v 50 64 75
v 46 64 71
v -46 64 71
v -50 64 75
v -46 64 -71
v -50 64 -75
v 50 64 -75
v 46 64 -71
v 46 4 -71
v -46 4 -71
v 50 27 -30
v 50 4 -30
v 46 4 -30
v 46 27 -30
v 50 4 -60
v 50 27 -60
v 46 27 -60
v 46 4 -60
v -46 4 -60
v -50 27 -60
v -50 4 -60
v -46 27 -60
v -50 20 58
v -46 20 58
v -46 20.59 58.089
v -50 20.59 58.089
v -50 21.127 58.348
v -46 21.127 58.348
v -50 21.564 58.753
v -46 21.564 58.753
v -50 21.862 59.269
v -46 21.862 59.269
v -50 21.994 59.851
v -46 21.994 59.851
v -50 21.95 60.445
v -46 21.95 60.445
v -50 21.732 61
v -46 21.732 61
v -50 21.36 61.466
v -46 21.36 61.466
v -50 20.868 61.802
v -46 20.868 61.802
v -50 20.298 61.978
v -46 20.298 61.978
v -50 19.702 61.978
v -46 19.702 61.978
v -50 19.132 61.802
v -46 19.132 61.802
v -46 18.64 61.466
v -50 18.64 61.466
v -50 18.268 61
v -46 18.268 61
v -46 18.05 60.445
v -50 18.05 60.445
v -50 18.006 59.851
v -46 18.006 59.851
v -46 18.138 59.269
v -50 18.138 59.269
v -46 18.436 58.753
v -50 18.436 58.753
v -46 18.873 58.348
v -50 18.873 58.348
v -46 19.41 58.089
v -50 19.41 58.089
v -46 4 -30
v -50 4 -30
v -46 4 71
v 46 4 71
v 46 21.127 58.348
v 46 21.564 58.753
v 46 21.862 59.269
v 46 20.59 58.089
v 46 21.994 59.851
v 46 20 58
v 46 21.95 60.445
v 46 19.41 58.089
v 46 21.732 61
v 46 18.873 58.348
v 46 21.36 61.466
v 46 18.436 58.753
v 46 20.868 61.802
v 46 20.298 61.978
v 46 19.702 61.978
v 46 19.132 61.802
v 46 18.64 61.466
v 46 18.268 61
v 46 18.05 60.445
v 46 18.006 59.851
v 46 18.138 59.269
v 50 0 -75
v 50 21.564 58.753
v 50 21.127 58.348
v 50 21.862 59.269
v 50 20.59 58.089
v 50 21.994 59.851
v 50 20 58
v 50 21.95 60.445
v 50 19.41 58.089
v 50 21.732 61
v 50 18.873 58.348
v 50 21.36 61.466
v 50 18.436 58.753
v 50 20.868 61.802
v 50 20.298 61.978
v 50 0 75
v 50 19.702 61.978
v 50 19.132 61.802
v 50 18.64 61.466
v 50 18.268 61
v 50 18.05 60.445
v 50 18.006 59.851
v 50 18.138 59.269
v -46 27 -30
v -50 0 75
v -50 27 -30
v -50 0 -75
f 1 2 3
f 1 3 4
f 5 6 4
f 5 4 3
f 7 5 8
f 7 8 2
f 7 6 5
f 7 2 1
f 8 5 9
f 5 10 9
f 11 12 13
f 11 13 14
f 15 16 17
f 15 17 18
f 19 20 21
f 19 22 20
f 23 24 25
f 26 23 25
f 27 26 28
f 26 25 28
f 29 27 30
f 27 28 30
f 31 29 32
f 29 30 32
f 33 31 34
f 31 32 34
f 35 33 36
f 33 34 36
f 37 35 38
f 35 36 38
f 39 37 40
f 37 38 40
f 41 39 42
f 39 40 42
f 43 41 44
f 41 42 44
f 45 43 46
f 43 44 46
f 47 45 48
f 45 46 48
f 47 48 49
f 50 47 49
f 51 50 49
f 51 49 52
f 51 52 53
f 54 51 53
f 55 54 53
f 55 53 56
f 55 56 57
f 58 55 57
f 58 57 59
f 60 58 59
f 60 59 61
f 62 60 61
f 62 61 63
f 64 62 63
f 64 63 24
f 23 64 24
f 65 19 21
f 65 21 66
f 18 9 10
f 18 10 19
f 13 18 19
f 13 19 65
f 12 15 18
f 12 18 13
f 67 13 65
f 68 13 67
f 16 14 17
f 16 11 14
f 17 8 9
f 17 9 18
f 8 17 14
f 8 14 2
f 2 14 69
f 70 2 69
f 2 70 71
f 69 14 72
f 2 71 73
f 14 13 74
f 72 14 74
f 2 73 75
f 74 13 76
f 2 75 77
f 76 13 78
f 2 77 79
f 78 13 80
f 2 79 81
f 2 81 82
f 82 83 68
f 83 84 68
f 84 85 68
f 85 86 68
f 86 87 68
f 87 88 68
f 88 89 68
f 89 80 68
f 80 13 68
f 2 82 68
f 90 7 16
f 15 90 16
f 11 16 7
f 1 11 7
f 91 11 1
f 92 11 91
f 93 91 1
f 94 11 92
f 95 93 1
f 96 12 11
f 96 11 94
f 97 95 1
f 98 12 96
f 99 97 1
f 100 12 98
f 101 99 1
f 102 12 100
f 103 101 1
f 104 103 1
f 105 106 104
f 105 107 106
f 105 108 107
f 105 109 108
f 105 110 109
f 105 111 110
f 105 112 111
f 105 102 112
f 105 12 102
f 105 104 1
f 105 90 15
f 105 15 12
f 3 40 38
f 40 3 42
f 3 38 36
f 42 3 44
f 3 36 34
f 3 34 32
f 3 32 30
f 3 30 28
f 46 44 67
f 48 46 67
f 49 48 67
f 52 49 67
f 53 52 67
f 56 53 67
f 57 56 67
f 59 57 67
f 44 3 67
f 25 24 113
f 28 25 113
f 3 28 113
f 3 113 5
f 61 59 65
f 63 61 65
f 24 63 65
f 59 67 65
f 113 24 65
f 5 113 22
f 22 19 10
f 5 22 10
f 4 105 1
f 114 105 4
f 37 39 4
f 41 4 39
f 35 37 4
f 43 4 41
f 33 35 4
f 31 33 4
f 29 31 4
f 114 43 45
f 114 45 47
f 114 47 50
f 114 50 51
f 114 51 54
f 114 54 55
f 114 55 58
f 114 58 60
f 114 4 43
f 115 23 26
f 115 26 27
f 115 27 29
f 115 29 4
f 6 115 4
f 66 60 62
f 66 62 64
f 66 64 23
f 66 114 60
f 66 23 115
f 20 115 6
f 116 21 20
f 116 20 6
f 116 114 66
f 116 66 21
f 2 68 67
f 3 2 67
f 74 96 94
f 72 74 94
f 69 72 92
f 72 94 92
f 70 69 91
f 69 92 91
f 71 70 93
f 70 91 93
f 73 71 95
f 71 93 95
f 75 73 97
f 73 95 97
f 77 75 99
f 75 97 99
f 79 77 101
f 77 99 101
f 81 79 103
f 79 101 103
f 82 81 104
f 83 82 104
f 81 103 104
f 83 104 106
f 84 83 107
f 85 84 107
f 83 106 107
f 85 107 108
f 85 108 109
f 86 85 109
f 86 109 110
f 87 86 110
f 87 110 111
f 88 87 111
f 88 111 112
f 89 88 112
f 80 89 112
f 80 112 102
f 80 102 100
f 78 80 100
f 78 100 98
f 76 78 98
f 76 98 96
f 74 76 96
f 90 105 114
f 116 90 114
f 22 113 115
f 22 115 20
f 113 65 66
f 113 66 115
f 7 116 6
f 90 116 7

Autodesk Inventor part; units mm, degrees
ref_plane "YZ Plane" through (0, 0, 0) normal (1, 0, 0) x (0, 1, 0)
ref_plane "XZ Plane" through (0, 0, 0) normal (0, 1, 0) x (-1, 0, 0)
ref_plane "XY Plane" through (0, 0, 0) normal (0, 0, 1) x (1, 0, 0)
sketch "Эскиз1" plane through (0, 0, 0) normal (0, 1, 0) x (-1, 0, 0)
  line L0 (-50, 75) -> (50, 75)
  line L1 (50, 75) -> (50, -75)
  line L2 (50, -75) -> (-50, -75)
  line L3 (-50, -75) -> (-50, 75)
  line L4 (-50, 75) -> (50, -75) construction
  line L5 (50, 75) -> (-50, -75) construction
  point P0 (0, 0)
  dimension "d0" = 150
  dimension "d1" = 100
extrude "Выдавливание1" add sketch "Эскиз1" along normal blind 4
sketch "Эскиз2" plane through (0, 4, 0) normal (0, 1, 0) x (1, 0, 0)
  line L0 (50, 75) -> (-50, 75) projected
  line L1 (50, -75) -> (-50, -75)
  line L2 (-50, -75) -> (-50, 75)
  line L3 (-50, 75) -> (50, 75)
  line L4 (50, 75) -> (50, -75)
  line L5 (50, -75) -> (-50, 75) construction
  line L6 (-50, -75) -> (50, 75) construction
  line L7 (46, -71) -> (-46, -71)
  line L8 (-46, -71) -> (-46, 71)
  line L9 (-46, 71) -> (46, 71)
  line L10 (46, 71) -> (46, -71)
  line L11 (46, -71) -> (-46, 71) construction
  line L12 (-46, -71) -> (46, 71) construction
  point P0 (0, 0)
  dimension "d4" = 4
  dimension "d5" = 4
extrude "Выдавливание2" add sketch "Эскиз2" along normal blind 60
sketch "Эскиз3" plane through (50, 0, 75) normal (1, 0, 0) x (0, 0, -1)
  line L0 (150, 0) -> (0, 0) projected
  circle A0 centre (15, 20) radius 2
  point P0 (75, 0)
  dimension "d10" = 4
extrude "Выдавливание3" cut sketch "Эскиз3" against normal blind 135.5
sketch "Эскиз4" plane through (50, 0, 75) normal (1, 0, 0) x (0, 0, -1)
  line L0 (150, 0) -> (0, 0) projected
  line L1 (146, 4) -> (4, 4) projected
  line L2 (135, 4) -> (105, 4)
  line L3 (105, 4) -> (105, 27)
  line L4 (105, 27) -> (135, 27)
  line L5 (135, 27) -> (135, 4)
  point P0 (75, 0)
  dimension "d14" = 23
  dimension "d15" = 30
extrude "Выдавливание4" cut sketch "Эскиз4" against normal blind 135.5
properties part number "эвакуатор"
